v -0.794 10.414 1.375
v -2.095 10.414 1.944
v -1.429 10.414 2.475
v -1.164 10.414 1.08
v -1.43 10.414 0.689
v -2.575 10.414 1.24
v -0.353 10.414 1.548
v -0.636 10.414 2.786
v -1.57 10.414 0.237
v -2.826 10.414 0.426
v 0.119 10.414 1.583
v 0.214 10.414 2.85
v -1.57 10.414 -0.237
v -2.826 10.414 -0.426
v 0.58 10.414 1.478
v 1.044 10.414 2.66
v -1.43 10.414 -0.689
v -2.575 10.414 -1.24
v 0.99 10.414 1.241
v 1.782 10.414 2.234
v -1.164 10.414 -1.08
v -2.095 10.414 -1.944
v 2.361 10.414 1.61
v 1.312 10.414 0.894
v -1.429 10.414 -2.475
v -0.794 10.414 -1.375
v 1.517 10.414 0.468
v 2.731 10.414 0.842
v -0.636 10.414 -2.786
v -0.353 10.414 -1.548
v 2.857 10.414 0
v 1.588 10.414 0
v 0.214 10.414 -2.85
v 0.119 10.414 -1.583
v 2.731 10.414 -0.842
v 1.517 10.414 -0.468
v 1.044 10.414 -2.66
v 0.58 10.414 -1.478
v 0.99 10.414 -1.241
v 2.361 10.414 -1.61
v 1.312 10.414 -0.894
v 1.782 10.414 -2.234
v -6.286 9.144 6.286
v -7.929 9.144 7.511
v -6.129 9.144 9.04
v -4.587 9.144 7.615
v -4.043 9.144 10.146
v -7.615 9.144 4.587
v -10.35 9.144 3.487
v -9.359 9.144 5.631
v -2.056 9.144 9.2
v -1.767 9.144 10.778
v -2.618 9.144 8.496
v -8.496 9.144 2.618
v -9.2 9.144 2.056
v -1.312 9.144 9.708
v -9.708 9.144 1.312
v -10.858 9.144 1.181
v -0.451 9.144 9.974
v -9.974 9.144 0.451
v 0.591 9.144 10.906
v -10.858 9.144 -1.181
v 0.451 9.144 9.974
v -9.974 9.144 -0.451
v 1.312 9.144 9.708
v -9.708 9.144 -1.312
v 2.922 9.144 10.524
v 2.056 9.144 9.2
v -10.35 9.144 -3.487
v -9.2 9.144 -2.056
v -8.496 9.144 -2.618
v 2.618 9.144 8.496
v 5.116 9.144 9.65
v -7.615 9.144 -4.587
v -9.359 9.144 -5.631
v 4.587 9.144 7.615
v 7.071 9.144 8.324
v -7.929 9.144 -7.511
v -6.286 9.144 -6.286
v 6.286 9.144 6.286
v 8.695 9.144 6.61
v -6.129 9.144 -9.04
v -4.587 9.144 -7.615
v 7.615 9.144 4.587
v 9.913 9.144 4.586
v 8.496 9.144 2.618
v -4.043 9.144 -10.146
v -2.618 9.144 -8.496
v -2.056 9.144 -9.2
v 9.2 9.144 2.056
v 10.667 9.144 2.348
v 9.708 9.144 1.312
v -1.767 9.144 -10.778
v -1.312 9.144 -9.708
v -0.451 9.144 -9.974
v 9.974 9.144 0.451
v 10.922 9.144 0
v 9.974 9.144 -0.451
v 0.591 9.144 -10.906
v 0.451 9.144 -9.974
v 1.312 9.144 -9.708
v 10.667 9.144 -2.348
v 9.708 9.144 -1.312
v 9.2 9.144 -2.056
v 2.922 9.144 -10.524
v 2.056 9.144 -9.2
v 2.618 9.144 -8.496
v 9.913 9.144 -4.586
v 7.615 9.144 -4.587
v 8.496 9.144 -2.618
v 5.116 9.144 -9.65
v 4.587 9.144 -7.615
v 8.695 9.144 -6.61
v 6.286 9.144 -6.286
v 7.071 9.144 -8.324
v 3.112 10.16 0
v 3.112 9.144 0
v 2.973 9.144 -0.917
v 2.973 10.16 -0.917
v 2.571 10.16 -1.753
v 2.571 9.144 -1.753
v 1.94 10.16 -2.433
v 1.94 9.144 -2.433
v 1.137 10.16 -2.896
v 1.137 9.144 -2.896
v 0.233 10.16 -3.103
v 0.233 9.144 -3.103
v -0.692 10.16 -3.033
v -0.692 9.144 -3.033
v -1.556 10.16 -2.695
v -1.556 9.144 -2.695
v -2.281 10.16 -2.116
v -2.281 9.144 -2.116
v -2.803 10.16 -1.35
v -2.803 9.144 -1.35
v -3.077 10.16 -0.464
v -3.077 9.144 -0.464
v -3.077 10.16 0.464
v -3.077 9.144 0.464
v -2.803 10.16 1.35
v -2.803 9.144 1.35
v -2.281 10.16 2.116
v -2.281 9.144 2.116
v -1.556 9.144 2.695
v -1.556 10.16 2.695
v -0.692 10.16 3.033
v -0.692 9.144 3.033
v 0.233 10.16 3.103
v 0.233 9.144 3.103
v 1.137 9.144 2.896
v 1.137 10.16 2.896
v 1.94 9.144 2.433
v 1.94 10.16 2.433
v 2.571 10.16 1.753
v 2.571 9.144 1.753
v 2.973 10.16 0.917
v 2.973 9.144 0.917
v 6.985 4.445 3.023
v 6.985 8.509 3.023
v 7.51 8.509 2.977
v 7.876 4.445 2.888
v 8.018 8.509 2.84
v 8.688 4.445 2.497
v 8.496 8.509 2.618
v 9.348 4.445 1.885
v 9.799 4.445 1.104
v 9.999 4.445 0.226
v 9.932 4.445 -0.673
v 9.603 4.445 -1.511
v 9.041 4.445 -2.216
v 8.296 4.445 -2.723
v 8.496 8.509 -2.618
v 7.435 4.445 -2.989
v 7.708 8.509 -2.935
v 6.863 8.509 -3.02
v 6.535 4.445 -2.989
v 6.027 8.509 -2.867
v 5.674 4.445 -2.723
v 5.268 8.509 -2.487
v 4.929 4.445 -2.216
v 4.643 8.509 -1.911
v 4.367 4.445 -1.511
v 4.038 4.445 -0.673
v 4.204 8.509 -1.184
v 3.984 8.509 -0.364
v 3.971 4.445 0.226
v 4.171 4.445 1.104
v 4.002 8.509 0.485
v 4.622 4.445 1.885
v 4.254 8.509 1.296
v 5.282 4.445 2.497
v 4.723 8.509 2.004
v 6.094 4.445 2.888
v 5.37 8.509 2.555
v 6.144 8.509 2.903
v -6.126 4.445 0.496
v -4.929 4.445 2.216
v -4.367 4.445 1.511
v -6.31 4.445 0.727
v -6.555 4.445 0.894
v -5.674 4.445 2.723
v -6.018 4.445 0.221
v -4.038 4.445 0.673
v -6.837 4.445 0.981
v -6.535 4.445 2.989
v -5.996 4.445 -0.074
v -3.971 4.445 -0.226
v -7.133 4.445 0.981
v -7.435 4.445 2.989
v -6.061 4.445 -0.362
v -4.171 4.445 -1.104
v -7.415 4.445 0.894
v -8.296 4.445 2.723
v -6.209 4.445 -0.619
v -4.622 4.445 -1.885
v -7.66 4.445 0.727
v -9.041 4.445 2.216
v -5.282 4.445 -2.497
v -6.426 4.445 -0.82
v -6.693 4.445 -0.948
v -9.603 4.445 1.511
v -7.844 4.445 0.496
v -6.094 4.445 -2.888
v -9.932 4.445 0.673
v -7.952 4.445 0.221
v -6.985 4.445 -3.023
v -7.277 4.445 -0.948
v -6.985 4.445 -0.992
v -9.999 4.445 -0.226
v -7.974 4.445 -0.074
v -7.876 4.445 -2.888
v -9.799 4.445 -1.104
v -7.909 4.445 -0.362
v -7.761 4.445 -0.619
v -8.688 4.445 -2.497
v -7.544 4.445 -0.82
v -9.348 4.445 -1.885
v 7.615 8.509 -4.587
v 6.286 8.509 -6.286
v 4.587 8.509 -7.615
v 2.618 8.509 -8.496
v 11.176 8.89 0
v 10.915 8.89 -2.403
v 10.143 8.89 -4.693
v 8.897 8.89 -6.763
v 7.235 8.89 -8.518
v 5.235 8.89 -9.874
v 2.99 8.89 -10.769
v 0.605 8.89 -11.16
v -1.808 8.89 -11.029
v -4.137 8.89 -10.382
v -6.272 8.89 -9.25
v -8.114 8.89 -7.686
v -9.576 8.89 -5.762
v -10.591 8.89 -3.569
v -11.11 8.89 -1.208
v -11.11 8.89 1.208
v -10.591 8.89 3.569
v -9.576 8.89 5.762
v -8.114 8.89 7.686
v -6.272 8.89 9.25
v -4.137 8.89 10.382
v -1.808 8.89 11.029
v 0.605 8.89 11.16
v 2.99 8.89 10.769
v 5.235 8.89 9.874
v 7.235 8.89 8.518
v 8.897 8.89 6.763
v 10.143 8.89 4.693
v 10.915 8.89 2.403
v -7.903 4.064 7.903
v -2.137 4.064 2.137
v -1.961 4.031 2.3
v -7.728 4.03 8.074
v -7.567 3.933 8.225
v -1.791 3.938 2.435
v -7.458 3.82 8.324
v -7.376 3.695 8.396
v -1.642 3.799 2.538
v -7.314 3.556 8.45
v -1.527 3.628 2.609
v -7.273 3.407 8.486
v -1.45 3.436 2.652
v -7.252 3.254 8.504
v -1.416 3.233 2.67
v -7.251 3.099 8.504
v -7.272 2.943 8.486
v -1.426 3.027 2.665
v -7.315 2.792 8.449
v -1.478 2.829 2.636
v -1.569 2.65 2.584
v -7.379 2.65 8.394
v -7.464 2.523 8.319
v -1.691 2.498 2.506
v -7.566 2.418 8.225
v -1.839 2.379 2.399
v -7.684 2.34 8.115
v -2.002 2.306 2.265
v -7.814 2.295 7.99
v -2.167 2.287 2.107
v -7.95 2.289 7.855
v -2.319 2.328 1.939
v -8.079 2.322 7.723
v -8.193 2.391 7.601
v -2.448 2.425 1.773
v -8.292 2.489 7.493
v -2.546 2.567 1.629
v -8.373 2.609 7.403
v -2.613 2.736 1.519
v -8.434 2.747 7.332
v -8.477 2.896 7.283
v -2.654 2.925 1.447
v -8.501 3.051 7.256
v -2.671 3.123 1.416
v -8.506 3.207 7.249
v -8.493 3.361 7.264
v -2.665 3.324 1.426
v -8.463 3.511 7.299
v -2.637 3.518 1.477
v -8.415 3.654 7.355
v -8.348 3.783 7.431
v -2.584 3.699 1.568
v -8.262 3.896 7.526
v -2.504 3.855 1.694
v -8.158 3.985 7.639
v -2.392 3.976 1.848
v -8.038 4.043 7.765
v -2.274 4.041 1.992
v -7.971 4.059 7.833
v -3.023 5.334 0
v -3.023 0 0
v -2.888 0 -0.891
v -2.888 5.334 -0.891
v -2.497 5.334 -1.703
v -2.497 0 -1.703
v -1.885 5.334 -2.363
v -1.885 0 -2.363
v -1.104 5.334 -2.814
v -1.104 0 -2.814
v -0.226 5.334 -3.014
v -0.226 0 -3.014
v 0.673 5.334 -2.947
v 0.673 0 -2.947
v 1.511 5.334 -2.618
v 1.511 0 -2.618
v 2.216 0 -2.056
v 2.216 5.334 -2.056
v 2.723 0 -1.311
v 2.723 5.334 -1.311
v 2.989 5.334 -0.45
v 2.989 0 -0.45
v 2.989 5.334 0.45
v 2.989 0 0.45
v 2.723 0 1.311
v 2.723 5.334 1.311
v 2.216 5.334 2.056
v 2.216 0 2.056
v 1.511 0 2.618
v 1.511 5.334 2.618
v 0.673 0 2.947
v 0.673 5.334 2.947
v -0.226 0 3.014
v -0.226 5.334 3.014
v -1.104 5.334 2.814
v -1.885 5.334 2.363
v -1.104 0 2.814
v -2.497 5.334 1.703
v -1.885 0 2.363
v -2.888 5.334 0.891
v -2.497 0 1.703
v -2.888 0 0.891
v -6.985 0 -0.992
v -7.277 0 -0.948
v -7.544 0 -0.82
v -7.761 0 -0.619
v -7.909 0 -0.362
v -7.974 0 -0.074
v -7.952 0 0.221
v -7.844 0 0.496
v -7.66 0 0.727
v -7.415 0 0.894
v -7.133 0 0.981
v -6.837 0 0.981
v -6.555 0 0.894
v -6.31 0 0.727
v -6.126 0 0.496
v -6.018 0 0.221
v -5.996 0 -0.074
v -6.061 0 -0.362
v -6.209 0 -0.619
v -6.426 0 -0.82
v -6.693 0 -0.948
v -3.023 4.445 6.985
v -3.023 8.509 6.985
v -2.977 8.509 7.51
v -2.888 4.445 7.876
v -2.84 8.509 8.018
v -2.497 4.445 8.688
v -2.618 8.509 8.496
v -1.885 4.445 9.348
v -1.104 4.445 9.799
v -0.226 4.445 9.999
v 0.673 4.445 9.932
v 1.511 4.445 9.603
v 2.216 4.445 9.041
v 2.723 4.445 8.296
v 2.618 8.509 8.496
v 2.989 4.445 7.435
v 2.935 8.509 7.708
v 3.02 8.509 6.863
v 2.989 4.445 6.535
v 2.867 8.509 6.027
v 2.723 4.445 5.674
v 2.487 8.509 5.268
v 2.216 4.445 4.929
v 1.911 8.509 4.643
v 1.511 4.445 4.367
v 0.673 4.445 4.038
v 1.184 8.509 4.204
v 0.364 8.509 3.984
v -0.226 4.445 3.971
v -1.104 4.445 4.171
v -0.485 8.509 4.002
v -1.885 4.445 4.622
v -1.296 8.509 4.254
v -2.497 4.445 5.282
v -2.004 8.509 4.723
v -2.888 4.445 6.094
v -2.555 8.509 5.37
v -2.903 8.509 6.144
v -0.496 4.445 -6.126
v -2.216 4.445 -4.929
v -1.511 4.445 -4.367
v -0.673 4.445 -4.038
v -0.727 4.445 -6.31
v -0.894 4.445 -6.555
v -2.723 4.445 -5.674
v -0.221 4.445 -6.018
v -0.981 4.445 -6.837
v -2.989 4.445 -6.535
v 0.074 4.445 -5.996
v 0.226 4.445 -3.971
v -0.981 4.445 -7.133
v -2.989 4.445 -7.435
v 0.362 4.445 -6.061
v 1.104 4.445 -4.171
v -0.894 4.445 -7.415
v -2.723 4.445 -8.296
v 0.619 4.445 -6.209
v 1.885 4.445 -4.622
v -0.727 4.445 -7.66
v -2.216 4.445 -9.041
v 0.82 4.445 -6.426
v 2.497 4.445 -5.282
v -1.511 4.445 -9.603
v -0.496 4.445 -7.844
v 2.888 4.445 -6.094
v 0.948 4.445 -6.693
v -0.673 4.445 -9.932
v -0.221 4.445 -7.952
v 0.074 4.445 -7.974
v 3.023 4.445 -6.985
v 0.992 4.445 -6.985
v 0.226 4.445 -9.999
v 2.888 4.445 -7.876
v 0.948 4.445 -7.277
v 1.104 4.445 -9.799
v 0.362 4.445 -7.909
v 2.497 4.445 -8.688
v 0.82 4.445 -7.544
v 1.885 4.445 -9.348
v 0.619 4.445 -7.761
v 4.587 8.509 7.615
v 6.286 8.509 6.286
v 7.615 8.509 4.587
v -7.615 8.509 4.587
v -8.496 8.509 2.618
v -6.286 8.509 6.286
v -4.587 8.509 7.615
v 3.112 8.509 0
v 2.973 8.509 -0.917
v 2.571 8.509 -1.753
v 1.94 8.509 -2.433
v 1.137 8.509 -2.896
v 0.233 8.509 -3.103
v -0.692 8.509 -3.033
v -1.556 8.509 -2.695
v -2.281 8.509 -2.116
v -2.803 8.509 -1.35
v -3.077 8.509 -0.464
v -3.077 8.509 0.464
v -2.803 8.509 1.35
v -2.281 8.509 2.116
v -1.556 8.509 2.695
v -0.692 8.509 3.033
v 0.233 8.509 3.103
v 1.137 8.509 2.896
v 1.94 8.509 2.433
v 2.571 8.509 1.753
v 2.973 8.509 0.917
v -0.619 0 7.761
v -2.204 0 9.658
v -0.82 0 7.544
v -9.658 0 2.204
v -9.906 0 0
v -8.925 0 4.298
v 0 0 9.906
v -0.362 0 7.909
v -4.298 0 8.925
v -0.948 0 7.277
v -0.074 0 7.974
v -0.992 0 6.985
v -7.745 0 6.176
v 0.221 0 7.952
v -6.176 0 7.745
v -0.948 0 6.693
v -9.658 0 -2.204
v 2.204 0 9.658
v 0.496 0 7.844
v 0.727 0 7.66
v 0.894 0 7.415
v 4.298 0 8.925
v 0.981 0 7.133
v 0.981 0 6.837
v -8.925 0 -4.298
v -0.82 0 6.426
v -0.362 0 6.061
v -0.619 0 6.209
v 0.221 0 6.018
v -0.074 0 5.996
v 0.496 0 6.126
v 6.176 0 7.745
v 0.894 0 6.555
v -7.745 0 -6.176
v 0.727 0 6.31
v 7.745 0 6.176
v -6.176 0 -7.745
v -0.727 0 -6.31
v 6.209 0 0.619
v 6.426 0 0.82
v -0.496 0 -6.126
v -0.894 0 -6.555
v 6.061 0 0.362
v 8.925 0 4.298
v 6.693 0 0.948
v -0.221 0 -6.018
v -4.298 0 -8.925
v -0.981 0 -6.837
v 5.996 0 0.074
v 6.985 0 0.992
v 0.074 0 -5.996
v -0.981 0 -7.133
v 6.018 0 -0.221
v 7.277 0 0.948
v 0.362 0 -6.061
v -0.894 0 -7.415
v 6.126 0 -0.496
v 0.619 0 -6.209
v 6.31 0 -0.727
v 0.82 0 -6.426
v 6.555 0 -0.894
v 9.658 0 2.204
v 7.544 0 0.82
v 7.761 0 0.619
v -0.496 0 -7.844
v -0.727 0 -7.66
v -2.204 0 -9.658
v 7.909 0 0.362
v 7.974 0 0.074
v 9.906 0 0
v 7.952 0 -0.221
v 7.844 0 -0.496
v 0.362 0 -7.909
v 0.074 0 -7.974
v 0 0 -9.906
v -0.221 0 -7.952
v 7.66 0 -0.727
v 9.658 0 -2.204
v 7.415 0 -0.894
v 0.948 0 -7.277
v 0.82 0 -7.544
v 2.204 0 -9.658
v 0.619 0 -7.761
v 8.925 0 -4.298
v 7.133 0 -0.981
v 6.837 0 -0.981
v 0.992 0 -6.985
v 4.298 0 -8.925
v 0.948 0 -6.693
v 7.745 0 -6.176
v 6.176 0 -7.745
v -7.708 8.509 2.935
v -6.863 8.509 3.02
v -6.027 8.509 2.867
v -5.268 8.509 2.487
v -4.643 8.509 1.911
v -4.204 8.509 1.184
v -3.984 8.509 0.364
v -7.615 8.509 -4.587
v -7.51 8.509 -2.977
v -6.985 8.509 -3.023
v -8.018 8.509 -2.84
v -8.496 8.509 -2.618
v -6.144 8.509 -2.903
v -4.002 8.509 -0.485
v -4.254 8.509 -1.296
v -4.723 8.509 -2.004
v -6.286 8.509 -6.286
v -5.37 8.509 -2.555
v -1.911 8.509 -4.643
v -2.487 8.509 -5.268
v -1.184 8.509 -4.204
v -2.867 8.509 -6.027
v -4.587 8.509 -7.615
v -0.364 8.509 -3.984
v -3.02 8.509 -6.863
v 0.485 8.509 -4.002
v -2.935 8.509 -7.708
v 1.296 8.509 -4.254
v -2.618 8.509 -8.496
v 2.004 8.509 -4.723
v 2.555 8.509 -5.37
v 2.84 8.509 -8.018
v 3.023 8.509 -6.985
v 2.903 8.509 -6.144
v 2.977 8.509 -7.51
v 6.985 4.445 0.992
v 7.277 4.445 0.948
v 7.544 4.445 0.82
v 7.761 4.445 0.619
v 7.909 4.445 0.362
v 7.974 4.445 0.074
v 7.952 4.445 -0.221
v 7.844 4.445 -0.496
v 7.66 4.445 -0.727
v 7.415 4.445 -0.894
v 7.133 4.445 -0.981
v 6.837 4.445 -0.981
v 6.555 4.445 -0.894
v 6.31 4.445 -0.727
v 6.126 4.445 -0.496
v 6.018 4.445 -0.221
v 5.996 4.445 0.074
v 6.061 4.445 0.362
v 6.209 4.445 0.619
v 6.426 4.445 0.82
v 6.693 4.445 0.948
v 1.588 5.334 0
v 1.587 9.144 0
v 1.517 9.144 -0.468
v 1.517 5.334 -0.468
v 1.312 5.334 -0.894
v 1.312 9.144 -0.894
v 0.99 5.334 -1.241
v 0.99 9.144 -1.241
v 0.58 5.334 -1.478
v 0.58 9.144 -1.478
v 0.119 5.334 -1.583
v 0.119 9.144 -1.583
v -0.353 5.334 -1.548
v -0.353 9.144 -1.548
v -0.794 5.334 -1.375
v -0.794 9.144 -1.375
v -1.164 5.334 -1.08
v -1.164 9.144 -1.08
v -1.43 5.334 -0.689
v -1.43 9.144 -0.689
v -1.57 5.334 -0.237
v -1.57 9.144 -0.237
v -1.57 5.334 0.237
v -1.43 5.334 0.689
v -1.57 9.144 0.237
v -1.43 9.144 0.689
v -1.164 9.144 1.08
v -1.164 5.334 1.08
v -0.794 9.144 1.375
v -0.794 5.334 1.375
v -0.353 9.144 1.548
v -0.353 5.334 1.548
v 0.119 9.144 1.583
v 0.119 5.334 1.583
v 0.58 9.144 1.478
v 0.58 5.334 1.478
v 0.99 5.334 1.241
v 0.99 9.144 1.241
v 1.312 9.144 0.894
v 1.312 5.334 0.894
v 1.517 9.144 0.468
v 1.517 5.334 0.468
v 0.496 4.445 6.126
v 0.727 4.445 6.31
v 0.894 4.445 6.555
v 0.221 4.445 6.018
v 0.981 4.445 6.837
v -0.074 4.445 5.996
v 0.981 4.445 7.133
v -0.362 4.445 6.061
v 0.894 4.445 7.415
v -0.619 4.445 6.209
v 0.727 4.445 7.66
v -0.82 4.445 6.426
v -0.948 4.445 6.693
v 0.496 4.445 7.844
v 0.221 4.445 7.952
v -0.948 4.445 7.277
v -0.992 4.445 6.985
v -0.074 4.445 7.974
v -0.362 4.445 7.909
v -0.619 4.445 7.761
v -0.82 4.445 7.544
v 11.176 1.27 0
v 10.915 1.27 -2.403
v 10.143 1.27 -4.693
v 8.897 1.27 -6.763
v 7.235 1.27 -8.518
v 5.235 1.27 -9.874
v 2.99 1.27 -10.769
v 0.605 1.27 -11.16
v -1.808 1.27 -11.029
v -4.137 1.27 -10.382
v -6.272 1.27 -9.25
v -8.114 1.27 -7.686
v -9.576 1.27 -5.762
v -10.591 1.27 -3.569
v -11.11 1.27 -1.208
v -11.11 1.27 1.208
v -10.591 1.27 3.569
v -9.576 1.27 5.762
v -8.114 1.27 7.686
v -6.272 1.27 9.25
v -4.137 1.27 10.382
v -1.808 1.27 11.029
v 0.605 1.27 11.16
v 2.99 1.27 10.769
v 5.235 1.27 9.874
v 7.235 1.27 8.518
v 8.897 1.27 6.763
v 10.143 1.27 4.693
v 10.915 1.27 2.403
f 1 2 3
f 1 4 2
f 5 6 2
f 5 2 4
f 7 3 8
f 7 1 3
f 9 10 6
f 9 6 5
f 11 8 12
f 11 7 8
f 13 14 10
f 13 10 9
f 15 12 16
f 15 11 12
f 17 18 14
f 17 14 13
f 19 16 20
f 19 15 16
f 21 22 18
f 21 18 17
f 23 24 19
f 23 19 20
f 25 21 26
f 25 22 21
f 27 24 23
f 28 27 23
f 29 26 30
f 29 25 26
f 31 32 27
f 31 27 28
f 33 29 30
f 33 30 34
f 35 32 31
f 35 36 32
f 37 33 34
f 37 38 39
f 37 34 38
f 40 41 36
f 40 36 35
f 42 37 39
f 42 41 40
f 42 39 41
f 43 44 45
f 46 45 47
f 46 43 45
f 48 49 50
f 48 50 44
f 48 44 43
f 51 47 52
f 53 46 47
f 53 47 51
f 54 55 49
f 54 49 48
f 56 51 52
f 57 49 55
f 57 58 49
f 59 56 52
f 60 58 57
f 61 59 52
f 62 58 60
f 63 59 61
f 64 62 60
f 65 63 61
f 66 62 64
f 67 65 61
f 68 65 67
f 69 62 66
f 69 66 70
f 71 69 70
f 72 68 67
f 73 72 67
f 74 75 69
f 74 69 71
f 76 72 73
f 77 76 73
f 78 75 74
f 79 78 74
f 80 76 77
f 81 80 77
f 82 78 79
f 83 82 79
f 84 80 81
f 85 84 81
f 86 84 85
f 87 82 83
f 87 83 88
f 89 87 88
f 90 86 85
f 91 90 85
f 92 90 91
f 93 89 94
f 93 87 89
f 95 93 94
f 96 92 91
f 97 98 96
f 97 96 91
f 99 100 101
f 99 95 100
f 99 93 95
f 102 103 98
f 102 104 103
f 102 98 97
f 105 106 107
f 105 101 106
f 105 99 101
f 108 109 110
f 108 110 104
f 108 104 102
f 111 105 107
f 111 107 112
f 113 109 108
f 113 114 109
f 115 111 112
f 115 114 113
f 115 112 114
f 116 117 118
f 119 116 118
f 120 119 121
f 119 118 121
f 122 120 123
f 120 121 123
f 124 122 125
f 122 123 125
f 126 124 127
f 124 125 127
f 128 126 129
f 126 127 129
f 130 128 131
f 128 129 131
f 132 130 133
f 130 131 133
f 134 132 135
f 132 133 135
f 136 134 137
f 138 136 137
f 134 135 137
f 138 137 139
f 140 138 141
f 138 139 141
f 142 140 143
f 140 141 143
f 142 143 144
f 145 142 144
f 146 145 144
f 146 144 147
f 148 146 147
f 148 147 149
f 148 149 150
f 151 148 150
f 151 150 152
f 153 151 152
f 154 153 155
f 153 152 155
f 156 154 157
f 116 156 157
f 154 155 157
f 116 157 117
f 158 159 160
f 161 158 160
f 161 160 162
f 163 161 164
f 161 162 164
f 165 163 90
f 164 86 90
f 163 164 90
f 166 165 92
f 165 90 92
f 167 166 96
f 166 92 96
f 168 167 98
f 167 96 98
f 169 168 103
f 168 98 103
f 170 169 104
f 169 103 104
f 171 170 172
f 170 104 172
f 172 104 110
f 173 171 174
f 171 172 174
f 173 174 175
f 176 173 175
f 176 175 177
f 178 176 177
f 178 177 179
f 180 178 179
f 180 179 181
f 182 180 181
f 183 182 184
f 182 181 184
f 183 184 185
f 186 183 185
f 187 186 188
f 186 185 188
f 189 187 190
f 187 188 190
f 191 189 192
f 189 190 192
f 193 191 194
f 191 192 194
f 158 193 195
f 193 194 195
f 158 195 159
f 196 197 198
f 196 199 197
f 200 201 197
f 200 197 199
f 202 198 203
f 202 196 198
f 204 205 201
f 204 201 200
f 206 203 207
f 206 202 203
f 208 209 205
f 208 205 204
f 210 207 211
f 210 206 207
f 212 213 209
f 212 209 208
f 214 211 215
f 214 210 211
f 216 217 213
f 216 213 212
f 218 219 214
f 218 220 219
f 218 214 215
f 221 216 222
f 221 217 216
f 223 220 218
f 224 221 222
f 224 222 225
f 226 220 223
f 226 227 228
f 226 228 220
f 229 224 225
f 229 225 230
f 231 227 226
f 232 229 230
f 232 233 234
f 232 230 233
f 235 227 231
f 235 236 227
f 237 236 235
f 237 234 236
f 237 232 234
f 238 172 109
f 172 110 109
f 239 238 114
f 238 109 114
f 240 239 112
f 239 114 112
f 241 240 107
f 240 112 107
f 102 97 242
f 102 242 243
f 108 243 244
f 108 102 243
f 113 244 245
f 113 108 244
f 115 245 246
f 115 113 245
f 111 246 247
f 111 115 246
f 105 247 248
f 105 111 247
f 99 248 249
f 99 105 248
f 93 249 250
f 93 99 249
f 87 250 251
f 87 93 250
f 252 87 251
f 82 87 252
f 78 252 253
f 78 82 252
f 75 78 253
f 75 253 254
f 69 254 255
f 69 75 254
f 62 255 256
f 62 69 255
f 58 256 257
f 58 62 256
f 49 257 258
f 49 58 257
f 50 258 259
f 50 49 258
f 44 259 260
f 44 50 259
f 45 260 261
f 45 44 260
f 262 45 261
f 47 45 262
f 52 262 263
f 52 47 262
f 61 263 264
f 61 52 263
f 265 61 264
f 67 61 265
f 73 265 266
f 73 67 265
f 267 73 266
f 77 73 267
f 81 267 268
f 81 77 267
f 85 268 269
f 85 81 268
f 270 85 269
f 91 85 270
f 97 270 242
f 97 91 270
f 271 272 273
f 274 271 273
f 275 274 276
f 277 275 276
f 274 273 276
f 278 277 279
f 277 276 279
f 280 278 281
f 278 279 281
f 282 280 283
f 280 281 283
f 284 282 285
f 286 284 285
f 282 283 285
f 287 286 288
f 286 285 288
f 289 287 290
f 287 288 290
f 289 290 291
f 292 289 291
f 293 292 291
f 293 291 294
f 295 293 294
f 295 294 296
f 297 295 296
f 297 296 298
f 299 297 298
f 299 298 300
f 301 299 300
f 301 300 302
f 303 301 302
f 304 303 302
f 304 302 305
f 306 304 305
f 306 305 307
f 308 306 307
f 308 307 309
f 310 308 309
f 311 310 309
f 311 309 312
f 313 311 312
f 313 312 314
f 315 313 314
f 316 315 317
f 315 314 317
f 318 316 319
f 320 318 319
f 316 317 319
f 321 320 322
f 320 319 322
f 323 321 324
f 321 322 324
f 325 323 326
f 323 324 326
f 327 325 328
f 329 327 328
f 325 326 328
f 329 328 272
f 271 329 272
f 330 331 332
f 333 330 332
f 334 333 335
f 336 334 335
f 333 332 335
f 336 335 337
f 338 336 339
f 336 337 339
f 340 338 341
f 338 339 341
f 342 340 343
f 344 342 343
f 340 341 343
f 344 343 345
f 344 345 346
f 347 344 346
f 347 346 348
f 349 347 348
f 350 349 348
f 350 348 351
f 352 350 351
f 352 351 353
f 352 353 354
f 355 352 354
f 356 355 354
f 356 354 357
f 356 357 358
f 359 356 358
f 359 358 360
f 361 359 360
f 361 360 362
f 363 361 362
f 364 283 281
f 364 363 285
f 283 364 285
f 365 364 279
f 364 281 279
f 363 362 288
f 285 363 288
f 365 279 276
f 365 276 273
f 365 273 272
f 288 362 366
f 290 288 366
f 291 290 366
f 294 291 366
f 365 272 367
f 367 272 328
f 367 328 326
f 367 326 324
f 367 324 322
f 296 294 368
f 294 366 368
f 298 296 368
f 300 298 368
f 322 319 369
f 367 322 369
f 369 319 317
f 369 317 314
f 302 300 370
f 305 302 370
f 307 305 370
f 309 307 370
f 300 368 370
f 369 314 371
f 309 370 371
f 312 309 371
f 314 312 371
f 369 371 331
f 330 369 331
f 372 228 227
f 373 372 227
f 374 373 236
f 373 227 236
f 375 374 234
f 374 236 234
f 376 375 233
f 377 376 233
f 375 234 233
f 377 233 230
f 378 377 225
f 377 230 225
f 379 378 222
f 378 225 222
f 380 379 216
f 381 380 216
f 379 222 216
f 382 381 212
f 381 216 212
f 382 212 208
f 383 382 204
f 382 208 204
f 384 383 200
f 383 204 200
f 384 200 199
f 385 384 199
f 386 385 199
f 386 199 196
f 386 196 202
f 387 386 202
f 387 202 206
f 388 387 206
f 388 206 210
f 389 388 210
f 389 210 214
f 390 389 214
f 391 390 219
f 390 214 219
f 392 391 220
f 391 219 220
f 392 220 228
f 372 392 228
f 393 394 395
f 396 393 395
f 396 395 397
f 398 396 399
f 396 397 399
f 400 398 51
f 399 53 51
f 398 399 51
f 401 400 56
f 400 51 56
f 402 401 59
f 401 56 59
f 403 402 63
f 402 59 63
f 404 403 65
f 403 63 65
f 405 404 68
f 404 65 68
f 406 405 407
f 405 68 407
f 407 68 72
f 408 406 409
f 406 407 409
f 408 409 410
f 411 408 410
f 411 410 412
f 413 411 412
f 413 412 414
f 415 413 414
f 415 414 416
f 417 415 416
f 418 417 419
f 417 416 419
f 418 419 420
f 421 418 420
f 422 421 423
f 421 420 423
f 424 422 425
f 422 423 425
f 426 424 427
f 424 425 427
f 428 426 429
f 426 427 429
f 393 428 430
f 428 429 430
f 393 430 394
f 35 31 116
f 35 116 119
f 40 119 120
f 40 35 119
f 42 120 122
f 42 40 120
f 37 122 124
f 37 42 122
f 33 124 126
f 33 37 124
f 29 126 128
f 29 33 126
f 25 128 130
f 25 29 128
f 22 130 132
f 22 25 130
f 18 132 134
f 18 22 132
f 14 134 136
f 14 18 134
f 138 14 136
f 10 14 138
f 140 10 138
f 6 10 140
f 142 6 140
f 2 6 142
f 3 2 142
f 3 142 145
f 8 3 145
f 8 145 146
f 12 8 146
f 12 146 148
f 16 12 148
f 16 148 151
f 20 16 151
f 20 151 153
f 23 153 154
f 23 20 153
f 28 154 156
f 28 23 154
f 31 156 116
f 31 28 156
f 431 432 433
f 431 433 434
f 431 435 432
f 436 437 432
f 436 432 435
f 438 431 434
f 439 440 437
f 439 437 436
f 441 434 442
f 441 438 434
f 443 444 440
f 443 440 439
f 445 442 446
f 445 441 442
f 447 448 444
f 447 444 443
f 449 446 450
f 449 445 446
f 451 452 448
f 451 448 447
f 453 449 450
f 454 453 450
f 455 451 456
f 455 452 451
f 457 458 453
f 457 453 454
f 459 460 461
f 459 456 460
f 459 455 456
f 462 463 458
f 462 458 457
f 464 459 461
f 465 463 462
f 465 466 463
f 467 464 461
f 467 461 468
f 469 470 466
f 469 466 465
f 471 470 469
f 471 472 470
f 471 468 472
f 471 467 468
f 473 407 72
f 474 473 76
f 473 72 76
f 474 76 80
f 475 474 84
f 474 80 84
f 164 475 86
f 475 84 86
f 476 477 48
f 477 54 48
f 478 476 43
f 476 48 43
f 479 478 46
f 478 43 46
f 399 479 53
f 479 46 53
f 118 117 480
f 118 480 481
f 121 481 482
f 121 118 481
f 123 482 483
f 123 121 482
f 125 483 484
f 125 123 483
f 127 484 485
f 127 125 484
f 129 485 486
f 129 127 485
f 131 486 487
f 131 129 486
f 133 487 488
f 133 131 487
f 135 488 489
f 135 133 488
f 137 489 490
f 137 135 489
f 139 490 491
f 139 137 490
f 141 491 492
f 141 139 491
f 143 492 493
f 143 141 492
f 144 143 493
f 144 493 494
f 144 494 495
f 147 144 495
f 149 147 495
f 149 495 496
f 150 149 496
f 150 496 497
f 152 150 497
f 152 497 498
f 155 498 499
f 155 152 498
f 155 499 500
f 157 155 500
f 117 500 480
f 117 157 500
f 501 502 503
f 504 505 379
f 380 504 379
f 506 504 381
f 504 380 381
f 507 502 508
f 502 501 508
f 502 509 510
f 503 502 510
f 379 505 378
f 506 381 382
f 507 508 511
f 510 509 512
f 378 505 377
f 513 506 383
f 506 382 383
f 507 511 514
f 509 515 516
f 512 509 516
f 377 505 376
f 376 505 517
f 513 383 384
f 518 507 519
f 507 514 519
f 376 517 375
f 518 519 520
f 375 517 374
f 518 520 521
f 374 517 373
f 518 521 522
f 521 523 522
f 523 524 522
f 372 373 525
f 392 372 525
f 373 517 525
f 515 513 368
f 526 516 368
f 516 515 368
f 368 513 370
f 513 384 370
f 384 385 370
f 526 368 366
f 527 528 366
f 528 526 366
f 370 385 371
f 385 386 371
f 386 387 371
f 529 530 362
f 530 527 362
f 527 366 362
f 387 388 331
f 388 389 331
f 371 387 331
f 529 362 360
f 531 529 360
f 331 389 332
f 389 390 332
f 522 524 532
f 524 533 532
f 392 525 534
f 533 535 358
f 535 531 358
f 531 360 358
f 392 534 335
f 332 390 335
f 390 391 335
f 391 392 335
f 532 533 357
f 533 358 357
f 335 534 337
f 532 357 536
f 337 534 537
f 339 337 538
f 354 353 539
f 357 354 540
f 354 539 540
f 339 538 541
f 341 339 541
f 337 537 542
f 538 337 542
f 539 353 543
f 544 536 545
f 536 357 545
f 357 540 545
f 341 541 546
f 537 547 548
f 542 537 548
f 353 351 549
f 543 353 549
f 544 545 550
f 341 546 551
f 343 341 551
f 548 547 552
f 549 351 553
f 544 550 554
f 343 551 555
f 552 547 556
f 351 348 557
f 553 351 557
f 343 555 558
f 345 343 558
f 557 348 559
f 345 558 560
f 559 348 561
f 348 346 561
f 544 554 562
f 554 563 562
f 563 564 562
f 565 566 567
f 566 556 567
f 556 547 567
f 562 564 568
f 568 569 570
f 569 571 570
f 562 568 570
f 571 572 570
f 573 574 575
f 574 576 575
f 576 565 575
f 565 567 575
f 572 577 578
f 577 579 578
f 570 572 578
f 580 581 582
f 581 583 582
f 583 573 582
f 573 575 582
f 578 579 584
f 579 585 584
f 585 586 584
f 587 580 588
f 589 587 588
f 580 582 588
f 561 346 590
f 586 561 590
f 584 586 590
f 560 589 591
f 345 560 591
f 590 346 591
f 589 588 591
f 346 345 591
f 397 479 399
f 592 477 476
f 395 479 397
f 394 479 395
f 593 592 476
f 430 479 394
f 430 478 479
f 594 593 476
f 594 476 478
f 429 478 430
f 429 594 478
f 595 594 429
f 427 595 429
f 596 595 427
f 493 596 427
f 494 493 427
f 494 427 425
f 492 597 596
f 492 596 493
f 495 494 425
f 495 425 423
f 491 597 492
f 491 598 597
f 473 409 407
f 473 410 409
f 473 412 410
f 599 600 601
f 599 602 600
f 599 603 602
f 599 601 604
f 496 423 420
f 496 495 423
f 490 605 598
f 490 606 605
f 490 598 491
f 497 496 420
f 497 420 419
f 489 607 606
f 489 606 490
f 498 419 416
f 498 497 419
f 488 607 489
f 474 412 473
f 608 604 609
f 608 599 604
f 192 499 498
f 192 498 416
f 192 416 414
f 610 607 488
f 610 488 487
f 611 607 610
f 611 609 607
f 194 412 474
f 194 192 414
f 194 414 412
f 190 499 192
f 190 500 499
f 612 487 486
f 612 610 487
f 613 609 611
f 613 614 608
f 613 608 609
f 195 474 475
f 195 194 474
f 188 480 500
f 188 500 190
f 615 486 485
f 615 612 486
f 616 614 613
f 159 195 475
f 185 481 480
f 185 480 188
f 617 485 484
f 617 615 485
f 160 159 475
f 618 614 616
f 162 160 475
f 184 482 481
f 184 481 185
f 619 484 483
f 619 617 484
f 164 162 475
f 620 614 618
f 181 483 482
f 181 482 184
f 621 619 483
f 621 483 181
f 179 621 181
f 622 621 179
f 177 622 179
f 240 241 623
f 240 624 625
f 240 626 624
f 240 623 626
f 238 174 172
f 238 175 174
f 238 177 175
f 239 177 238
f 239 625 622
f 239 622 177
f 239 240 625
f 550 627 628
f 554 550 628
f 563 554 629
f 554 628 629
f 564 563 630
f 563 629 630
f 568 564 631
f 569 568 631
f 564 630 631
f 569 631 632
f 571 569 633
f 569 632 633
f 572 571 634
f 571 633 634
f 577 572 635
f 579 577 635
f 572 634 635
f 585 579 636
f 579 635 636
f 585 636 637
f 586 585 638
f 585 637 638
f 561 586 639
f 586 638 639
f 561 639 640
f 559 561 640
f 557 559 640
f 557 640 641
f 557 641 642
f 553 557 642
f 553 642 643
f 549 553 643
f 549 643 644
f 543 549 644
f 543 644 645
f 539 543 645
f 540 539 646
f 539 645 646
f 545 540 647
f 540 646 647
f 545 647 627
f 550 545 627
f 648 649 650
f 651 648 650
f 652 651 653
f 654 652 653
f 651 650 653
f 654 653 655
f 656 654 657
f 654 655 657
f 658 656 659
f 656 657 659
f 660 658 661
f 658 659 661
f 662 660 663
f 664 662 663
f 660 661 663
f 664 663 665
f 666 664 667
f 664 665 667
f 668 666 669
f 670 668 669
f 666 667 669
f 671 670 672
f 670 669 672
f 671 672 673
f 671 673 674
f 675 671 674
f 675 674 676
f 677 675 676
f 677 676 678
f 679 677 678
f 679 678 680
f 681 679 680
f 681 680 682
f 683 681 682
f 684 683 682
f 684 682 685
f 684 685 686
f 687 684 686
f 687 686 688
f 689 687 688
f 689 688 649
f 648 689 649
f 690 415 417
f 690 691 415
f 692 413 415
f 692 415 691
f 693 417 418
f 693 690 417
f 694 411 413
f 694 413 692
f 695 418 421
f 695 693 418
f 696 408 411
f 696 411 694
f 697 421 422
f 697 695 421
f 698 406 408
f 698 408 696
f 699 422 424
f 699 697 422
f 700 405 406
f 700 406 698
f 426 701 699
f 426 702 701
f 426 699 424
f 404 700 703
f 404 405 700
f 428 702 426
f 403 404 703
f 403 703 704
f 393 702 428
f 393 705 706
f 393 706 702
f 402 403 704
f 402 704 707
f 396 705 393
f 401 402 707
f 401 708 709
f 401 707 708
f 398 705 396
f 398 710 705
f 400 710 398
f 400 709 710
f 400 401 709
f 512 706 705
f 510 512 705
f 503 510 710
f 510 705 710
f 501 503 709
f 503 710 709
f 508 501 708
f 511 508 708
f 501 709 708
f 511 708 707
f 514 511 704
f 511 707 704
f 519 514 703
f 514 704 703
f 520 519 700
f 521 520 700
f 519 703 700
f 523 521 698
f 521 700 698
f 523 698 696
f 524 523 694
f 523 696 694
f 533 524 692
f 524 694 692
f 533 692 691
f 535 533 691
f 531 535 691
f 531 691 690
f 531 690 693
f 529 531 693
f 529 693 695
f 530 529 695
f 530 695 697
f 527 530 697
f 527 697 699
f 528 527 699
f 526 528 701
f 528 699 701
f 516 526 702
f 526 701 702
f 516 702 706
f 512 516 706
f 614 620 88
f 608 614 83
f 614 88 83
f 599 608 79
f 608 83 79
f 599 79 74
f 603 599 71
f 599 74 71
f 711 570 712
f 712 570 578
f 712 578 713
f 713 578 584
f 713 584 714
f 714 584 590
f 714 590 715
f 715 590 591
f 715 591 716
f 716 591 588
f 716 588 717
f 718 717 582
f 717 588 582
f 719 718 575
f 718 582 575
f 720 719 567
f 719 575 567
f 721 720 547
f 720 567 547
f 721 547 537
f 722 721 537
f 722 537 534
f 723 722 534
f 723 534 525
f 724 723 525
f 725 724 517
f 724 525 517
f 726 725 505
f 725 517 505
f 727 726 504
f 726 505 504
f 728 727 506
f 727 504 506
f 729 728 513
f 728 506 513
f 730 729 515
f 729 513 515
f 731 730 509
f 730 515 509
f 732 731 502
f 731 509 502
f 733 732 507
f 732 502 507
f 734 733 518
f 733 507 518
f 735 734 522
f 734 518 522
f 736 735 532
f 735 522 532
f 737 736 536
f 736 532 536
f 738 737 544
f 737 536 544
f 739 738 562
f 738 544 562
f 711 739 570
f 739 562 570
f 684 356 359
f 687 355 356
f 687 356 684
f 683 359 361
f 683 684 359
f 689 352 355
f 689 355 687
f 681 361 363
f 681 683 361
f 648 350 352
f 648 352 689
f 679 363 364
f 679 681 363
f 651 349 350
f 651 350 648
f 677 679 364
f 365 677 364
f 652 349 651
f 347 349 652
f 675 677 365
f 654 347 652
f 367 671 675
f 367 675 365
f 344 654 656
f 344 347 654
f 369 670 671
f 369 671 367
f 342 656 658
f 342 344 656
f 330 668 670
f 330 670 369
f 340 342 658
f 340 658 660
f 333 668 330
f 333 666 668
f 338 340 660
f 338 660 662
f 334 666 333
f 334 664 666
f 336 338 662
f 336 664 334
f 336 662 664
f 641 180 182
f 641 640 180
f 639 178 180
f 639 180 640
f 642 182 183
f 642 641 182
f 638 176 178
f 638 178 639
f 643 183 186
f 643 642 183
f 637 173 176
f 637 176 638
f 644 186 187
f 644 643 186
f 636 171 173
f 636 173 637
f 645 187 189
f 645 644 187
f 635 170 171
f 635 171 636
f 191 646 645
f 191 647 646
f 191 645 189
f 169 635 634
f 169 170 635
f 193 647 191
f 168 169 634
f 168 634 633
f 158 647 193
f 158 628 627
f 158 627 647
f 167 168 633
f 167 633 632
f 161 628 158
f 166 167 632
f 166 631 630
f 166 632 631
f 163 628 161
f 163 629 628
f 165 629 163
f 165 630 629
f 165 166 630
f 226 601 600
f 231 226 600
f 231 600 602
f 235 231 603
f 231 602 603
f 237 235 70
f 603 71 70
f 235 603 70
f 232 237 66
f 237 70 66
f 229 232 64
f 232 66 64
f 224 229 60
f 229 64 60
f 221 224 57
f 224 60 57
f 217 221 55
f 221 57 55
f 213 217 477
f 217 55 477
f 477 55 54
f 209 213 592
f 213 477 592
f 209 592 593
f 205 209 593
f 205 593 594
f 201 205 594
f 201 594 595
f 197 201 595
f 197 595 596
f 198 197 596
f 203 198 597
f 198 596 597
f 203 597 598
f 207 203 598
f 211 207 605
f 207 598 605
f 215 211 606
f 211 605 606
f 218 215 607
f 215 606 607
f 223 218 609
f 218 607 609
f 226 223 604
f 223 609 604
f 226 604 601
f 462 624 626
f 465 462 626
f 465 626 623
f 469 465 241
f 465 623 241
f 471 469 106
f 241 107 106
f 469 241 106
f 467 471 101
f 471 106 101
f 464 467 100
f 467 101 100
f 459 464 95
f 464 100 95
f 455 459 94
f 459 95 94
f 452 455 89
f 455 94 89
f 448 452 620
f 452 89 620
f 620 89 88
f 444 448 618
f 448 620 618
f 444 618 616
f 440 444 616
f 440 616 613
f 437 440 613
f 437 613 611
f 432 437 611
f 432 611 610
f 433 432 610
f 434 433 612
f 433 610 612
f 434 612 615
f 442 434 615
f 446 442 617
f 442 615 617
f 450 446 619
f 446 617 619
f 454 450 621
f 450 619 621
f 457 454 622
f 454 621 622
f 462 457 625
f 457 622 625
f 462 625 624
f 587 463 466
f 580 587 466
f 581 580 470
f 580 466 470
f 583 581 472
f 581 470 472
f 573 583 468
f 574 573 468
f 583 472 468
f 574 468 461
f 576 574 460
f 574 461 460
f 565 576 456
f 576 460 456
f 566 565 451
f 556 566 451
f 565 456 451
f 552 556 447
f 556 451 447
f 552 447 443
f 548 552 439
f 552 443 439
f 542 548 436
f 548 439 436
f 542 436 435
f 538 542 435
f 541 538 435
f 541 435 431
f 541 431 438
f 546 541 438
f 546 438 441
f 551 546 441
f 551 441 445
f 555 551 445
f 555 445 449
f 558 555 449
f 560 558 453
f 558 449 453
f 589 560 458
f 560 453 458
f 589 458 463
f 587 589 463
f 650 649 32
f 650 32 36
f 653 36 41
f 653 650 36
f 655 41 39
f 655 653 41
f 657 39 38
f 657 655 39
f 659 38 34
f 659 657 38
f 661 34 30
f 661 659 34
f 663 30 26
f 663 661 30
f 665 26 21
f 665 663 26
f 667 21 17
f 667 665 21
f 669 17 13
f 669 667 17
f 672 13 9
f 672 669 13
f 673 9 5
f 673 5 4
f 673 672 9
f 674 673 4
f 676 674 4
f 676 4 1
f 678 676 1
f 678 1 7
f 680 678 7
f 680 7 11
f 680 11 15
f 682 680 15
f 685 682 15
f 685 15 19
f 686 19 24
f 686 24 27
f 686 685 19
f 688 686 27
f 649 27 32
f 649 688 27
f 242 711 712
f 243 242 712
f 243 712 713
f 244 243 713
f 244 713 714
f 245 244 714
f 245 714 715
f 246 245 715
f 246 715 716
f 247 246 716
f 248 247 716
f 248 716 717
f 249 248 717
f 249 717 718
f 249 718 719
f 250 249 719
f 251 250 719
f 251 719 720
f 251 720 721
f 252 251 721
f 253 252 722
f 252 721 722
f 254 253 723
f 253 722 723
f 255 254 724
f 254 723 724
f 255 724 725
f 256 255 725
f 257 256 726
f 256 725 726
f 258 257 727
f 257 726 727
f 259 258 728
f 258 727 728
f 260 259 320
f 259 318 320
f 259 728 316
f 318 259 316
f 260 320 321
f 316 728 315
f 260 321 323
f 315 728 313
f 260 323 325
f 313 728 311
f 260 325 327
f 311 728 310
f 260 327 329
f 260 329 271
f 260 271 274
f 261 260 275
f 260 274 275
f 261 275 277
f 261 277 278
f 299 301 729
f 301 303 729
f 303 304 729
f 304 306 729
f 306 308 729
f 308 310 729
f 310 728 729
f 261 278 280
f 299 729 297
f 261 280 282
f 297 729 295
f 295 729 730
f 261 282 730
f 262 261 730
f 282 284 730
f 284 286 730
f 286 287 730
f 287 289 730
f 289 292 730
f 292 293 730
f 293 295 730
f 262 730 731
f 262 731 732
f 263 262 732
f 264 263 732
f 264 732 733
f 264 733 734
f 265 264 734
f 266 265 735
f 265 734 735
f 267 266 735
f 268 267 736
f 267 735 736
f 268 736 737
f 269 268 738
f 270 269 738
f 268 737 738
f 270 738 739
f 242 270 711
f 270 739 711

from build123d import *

# Parameters (mm, degrees)
SKETCH2_R                 = 11.176
BOSS_EXTRUDE1_DEPTH       = 9.144
SKETCH3_R                 = 8.89
SKETCH3_R_2               = 3.1115
CUT_EXTRUDE1_DEPTH        = 0.635
SKETCH4_R                 = 3.0226
CUT_EXTRUDE2_DEPTH        = 5.334
SKETCH6_R                 = 3.0226
CUT_EXTRUDE4_DEPTH        = 4.699
CIRPATTERN5_COUNT         = 4
SKETCH7_R                 = 1.5875
CUT_EXTRUDE5_DEPTH        = 8.255
CHAMFER1_SIZE             = 0.254
CHAMFER2_SIZE             = 1.27
CUT_EXTRUDE6_REACH        = 18.489
SKETCH8_R                 = 0.9921875
CIRPATTERN6_COUNT         = 4
BOSS_EXTRUDE2_START       = 1.27
SKETCH10_R                = 3.1115
SKETCH10_R_2              = 1.5875
BOSS_EXTRUDE2_DEPTH       = 1.27
CHAMFER3_SIZE             = 0.254
F_2_56_TAPPED_HOLE3_D     = 1.778
F_2_56_TAPPED_HOLE3_DEPTH = 11.43
F_2_56_TAPPED_HOLE3_TIP   = 0.53416509


with BuildPart() as part:
    # Sketch2 → Boss-Extrude1 (new body)
    with BuildSketch(Plane(origin=(0, 0, 0), x_dir=(1, 0, 0), z_dir=(0, 1, 0))):
        Circle(SKETCH2_R)
    extrude(amount=BOSS_EXTRUDE1_DEPTH)

    # Sketch3 → Cut-Extrude1 (cut)
    with BuildSketch(Plane(origin=(0, 9.144, 0), x_dir=(1, 0, 0), z_dir=(0, 1, 0))):
        Circle(SKETCH3_R)
        Circle(SKETCH3_R_2, mode=Mode.SUBTRACT)
    extrude(amount=-CUT_EXTRUDE1_DEPTH, mode=Mode.SUBTRACT)

    # Sketch4 → Cut-Extrude2 (cut)
    with BuildSketch(Plane(origin=(0, 0, 0), x_dir=(-1, 0, 0), z_dir=(0, -1, 0))):
        Circle(SKETCH4_R)
    extrude(amount=-CUT_EXTRUDE2_DEPTH, mode=Mode.SUBTRACT)

    # Sketch6 → Cut-Extrude4 (cut)
    with BuildSketch(Plane(origin=(0, 9.144, 0), x_dir=(1, 0, 0), z_dir=(0, 1, 0))):
        with Locations((0, 6.985)):
            Circle(SKETCH6_R)
    cut_extrude4 = extrude(amount=-CUT_EXTRUDE4_DEPTH, mode=Mode.SUBTRACT)

    # CirPattern5: Cut-Extrude4 ×4 about axis
    cirpattern5_axis = Axis((0, 5.334, 0), (0, -1, 0))
    for i in range(1, CIRPATTERN5_COUNT):
        add(cut_extrude4.rotate(cirpattern5_axis, i * 360 / CIRPATTERN5_COUNT), mode=Mode.SUBTRACT)

    # Sketch7 → Cut-Extrude5 (cut)
    with BuildSketch(Plane(origin=(0, 9.144, 0), x_dir=(1, 0, 0), z_dir=(0, 1, 0))):
        Circle(SKETCH7_R)
    extrude(amount=-CUT_EXTRUDE5_DEPTH, mode=Mode.SUBTRACT)

    # Chamfer1
    chamfer1_edges = [part.edges().sort_by_distance(p)[0] for p in [
        (-11.176, 9.144, 0),
    ]]
    chamfer(chamfer1_edges, length=CHAMFER1_SIZE)

    # Chamfer2
    chamfer2_edges = [part.edges().sort_by_distance(p)[0] for p in [
        (-11.176, 0, 0),
    ]]
    chamfer(chamfer2_edges, length=CHAMFER2_SIZE)

    # Sketch8 → Cut-Extrude6 (cut, up to next)
    with BuildSketch(Plane(origin=(0, 4.445, 0), x_dir=(1, 0, 0), z_dir=(0, 1, 0)), mode=Mode.PRIVATE) as cut_extrude6_sk1:
        with Locations((0, 6.985)):
            Circle(SKETCH8_R)
    cut_extrude6_tool1 = extrude(cut_extrude6_sk1.sketch, amount=-CUT_EXTRUDE6_REACH, mode=Mode.PRIVATE) & part.part
    cut_extrude6 = cut_extrude6_tool1.solids().sort_by_distance((0, 4.445, -6.985))[0]
    add(cut_extrude6, mode=Mode.SUBTRACT)

    # CirPattern6: Cut-Extrude6 ×4 about axis
    cirpattern6_axis = Axis((0, 9.144, 0), (0, -1, 0))
    for i in range(1, CIRPATTERN6_COUNT):
        add(cut_extrude6.rotate(cirpattern6_axis, i * 360 / CIRPATTERN6_COUNT), mode=Mode.SUBTRACT)

    # Sketch10 → Boss-Extrude2 (add)
    with BuildSketch(Plane(origin=(0, 9.144, 0), x_dir=(1, 0, 0), z_dir=(0, 1, 0)).offset(BOSS_EXTRUDE2_START)):
        Circle(SKETCH10_R)
        Circle(SKETCH10_R_2, mode=Mode.SUBTRACT)
    extrude(amount=-BOSS_EXTRUDE2_DEPTH)

    # Chamfer3
    chamfer3_edges = [part.edges().sort_by_distance(p)[0] for p in [
        (-3.1115, 10.414, 0),
    ]]
    chamfer(chamfer3_edges, length=CHAMFER3_SIZE)

    # #2-56 Tapped Hole3
    with Locations(Plane(origin=(-8.082230509, 0, 8.082230509), x_dir=(0, -1, 0), z_dir=(-0.7071067811865488, 0, 0.7071067811865464))):
        with Locations((-3.175, 0)):
            Hole(F_2_56_TAPPED_HOLE3_D / 2, depth=F_2_56_TAPPED_HOLE3_DEPTH)
            with Locations((0, 0, -(F_2_56_TAPPED_HOLE3_DEPTH + F_2_56_TAPPED_HOLE3_TIP / 2))):  # 118° drill point
                Cone(0, F_2_56_TAPPED_HOLE3_D / 2, F_2_56_TAPPED_HOLE3_TIP, mode=Mode.SUBTRACT)


solid = part.part
